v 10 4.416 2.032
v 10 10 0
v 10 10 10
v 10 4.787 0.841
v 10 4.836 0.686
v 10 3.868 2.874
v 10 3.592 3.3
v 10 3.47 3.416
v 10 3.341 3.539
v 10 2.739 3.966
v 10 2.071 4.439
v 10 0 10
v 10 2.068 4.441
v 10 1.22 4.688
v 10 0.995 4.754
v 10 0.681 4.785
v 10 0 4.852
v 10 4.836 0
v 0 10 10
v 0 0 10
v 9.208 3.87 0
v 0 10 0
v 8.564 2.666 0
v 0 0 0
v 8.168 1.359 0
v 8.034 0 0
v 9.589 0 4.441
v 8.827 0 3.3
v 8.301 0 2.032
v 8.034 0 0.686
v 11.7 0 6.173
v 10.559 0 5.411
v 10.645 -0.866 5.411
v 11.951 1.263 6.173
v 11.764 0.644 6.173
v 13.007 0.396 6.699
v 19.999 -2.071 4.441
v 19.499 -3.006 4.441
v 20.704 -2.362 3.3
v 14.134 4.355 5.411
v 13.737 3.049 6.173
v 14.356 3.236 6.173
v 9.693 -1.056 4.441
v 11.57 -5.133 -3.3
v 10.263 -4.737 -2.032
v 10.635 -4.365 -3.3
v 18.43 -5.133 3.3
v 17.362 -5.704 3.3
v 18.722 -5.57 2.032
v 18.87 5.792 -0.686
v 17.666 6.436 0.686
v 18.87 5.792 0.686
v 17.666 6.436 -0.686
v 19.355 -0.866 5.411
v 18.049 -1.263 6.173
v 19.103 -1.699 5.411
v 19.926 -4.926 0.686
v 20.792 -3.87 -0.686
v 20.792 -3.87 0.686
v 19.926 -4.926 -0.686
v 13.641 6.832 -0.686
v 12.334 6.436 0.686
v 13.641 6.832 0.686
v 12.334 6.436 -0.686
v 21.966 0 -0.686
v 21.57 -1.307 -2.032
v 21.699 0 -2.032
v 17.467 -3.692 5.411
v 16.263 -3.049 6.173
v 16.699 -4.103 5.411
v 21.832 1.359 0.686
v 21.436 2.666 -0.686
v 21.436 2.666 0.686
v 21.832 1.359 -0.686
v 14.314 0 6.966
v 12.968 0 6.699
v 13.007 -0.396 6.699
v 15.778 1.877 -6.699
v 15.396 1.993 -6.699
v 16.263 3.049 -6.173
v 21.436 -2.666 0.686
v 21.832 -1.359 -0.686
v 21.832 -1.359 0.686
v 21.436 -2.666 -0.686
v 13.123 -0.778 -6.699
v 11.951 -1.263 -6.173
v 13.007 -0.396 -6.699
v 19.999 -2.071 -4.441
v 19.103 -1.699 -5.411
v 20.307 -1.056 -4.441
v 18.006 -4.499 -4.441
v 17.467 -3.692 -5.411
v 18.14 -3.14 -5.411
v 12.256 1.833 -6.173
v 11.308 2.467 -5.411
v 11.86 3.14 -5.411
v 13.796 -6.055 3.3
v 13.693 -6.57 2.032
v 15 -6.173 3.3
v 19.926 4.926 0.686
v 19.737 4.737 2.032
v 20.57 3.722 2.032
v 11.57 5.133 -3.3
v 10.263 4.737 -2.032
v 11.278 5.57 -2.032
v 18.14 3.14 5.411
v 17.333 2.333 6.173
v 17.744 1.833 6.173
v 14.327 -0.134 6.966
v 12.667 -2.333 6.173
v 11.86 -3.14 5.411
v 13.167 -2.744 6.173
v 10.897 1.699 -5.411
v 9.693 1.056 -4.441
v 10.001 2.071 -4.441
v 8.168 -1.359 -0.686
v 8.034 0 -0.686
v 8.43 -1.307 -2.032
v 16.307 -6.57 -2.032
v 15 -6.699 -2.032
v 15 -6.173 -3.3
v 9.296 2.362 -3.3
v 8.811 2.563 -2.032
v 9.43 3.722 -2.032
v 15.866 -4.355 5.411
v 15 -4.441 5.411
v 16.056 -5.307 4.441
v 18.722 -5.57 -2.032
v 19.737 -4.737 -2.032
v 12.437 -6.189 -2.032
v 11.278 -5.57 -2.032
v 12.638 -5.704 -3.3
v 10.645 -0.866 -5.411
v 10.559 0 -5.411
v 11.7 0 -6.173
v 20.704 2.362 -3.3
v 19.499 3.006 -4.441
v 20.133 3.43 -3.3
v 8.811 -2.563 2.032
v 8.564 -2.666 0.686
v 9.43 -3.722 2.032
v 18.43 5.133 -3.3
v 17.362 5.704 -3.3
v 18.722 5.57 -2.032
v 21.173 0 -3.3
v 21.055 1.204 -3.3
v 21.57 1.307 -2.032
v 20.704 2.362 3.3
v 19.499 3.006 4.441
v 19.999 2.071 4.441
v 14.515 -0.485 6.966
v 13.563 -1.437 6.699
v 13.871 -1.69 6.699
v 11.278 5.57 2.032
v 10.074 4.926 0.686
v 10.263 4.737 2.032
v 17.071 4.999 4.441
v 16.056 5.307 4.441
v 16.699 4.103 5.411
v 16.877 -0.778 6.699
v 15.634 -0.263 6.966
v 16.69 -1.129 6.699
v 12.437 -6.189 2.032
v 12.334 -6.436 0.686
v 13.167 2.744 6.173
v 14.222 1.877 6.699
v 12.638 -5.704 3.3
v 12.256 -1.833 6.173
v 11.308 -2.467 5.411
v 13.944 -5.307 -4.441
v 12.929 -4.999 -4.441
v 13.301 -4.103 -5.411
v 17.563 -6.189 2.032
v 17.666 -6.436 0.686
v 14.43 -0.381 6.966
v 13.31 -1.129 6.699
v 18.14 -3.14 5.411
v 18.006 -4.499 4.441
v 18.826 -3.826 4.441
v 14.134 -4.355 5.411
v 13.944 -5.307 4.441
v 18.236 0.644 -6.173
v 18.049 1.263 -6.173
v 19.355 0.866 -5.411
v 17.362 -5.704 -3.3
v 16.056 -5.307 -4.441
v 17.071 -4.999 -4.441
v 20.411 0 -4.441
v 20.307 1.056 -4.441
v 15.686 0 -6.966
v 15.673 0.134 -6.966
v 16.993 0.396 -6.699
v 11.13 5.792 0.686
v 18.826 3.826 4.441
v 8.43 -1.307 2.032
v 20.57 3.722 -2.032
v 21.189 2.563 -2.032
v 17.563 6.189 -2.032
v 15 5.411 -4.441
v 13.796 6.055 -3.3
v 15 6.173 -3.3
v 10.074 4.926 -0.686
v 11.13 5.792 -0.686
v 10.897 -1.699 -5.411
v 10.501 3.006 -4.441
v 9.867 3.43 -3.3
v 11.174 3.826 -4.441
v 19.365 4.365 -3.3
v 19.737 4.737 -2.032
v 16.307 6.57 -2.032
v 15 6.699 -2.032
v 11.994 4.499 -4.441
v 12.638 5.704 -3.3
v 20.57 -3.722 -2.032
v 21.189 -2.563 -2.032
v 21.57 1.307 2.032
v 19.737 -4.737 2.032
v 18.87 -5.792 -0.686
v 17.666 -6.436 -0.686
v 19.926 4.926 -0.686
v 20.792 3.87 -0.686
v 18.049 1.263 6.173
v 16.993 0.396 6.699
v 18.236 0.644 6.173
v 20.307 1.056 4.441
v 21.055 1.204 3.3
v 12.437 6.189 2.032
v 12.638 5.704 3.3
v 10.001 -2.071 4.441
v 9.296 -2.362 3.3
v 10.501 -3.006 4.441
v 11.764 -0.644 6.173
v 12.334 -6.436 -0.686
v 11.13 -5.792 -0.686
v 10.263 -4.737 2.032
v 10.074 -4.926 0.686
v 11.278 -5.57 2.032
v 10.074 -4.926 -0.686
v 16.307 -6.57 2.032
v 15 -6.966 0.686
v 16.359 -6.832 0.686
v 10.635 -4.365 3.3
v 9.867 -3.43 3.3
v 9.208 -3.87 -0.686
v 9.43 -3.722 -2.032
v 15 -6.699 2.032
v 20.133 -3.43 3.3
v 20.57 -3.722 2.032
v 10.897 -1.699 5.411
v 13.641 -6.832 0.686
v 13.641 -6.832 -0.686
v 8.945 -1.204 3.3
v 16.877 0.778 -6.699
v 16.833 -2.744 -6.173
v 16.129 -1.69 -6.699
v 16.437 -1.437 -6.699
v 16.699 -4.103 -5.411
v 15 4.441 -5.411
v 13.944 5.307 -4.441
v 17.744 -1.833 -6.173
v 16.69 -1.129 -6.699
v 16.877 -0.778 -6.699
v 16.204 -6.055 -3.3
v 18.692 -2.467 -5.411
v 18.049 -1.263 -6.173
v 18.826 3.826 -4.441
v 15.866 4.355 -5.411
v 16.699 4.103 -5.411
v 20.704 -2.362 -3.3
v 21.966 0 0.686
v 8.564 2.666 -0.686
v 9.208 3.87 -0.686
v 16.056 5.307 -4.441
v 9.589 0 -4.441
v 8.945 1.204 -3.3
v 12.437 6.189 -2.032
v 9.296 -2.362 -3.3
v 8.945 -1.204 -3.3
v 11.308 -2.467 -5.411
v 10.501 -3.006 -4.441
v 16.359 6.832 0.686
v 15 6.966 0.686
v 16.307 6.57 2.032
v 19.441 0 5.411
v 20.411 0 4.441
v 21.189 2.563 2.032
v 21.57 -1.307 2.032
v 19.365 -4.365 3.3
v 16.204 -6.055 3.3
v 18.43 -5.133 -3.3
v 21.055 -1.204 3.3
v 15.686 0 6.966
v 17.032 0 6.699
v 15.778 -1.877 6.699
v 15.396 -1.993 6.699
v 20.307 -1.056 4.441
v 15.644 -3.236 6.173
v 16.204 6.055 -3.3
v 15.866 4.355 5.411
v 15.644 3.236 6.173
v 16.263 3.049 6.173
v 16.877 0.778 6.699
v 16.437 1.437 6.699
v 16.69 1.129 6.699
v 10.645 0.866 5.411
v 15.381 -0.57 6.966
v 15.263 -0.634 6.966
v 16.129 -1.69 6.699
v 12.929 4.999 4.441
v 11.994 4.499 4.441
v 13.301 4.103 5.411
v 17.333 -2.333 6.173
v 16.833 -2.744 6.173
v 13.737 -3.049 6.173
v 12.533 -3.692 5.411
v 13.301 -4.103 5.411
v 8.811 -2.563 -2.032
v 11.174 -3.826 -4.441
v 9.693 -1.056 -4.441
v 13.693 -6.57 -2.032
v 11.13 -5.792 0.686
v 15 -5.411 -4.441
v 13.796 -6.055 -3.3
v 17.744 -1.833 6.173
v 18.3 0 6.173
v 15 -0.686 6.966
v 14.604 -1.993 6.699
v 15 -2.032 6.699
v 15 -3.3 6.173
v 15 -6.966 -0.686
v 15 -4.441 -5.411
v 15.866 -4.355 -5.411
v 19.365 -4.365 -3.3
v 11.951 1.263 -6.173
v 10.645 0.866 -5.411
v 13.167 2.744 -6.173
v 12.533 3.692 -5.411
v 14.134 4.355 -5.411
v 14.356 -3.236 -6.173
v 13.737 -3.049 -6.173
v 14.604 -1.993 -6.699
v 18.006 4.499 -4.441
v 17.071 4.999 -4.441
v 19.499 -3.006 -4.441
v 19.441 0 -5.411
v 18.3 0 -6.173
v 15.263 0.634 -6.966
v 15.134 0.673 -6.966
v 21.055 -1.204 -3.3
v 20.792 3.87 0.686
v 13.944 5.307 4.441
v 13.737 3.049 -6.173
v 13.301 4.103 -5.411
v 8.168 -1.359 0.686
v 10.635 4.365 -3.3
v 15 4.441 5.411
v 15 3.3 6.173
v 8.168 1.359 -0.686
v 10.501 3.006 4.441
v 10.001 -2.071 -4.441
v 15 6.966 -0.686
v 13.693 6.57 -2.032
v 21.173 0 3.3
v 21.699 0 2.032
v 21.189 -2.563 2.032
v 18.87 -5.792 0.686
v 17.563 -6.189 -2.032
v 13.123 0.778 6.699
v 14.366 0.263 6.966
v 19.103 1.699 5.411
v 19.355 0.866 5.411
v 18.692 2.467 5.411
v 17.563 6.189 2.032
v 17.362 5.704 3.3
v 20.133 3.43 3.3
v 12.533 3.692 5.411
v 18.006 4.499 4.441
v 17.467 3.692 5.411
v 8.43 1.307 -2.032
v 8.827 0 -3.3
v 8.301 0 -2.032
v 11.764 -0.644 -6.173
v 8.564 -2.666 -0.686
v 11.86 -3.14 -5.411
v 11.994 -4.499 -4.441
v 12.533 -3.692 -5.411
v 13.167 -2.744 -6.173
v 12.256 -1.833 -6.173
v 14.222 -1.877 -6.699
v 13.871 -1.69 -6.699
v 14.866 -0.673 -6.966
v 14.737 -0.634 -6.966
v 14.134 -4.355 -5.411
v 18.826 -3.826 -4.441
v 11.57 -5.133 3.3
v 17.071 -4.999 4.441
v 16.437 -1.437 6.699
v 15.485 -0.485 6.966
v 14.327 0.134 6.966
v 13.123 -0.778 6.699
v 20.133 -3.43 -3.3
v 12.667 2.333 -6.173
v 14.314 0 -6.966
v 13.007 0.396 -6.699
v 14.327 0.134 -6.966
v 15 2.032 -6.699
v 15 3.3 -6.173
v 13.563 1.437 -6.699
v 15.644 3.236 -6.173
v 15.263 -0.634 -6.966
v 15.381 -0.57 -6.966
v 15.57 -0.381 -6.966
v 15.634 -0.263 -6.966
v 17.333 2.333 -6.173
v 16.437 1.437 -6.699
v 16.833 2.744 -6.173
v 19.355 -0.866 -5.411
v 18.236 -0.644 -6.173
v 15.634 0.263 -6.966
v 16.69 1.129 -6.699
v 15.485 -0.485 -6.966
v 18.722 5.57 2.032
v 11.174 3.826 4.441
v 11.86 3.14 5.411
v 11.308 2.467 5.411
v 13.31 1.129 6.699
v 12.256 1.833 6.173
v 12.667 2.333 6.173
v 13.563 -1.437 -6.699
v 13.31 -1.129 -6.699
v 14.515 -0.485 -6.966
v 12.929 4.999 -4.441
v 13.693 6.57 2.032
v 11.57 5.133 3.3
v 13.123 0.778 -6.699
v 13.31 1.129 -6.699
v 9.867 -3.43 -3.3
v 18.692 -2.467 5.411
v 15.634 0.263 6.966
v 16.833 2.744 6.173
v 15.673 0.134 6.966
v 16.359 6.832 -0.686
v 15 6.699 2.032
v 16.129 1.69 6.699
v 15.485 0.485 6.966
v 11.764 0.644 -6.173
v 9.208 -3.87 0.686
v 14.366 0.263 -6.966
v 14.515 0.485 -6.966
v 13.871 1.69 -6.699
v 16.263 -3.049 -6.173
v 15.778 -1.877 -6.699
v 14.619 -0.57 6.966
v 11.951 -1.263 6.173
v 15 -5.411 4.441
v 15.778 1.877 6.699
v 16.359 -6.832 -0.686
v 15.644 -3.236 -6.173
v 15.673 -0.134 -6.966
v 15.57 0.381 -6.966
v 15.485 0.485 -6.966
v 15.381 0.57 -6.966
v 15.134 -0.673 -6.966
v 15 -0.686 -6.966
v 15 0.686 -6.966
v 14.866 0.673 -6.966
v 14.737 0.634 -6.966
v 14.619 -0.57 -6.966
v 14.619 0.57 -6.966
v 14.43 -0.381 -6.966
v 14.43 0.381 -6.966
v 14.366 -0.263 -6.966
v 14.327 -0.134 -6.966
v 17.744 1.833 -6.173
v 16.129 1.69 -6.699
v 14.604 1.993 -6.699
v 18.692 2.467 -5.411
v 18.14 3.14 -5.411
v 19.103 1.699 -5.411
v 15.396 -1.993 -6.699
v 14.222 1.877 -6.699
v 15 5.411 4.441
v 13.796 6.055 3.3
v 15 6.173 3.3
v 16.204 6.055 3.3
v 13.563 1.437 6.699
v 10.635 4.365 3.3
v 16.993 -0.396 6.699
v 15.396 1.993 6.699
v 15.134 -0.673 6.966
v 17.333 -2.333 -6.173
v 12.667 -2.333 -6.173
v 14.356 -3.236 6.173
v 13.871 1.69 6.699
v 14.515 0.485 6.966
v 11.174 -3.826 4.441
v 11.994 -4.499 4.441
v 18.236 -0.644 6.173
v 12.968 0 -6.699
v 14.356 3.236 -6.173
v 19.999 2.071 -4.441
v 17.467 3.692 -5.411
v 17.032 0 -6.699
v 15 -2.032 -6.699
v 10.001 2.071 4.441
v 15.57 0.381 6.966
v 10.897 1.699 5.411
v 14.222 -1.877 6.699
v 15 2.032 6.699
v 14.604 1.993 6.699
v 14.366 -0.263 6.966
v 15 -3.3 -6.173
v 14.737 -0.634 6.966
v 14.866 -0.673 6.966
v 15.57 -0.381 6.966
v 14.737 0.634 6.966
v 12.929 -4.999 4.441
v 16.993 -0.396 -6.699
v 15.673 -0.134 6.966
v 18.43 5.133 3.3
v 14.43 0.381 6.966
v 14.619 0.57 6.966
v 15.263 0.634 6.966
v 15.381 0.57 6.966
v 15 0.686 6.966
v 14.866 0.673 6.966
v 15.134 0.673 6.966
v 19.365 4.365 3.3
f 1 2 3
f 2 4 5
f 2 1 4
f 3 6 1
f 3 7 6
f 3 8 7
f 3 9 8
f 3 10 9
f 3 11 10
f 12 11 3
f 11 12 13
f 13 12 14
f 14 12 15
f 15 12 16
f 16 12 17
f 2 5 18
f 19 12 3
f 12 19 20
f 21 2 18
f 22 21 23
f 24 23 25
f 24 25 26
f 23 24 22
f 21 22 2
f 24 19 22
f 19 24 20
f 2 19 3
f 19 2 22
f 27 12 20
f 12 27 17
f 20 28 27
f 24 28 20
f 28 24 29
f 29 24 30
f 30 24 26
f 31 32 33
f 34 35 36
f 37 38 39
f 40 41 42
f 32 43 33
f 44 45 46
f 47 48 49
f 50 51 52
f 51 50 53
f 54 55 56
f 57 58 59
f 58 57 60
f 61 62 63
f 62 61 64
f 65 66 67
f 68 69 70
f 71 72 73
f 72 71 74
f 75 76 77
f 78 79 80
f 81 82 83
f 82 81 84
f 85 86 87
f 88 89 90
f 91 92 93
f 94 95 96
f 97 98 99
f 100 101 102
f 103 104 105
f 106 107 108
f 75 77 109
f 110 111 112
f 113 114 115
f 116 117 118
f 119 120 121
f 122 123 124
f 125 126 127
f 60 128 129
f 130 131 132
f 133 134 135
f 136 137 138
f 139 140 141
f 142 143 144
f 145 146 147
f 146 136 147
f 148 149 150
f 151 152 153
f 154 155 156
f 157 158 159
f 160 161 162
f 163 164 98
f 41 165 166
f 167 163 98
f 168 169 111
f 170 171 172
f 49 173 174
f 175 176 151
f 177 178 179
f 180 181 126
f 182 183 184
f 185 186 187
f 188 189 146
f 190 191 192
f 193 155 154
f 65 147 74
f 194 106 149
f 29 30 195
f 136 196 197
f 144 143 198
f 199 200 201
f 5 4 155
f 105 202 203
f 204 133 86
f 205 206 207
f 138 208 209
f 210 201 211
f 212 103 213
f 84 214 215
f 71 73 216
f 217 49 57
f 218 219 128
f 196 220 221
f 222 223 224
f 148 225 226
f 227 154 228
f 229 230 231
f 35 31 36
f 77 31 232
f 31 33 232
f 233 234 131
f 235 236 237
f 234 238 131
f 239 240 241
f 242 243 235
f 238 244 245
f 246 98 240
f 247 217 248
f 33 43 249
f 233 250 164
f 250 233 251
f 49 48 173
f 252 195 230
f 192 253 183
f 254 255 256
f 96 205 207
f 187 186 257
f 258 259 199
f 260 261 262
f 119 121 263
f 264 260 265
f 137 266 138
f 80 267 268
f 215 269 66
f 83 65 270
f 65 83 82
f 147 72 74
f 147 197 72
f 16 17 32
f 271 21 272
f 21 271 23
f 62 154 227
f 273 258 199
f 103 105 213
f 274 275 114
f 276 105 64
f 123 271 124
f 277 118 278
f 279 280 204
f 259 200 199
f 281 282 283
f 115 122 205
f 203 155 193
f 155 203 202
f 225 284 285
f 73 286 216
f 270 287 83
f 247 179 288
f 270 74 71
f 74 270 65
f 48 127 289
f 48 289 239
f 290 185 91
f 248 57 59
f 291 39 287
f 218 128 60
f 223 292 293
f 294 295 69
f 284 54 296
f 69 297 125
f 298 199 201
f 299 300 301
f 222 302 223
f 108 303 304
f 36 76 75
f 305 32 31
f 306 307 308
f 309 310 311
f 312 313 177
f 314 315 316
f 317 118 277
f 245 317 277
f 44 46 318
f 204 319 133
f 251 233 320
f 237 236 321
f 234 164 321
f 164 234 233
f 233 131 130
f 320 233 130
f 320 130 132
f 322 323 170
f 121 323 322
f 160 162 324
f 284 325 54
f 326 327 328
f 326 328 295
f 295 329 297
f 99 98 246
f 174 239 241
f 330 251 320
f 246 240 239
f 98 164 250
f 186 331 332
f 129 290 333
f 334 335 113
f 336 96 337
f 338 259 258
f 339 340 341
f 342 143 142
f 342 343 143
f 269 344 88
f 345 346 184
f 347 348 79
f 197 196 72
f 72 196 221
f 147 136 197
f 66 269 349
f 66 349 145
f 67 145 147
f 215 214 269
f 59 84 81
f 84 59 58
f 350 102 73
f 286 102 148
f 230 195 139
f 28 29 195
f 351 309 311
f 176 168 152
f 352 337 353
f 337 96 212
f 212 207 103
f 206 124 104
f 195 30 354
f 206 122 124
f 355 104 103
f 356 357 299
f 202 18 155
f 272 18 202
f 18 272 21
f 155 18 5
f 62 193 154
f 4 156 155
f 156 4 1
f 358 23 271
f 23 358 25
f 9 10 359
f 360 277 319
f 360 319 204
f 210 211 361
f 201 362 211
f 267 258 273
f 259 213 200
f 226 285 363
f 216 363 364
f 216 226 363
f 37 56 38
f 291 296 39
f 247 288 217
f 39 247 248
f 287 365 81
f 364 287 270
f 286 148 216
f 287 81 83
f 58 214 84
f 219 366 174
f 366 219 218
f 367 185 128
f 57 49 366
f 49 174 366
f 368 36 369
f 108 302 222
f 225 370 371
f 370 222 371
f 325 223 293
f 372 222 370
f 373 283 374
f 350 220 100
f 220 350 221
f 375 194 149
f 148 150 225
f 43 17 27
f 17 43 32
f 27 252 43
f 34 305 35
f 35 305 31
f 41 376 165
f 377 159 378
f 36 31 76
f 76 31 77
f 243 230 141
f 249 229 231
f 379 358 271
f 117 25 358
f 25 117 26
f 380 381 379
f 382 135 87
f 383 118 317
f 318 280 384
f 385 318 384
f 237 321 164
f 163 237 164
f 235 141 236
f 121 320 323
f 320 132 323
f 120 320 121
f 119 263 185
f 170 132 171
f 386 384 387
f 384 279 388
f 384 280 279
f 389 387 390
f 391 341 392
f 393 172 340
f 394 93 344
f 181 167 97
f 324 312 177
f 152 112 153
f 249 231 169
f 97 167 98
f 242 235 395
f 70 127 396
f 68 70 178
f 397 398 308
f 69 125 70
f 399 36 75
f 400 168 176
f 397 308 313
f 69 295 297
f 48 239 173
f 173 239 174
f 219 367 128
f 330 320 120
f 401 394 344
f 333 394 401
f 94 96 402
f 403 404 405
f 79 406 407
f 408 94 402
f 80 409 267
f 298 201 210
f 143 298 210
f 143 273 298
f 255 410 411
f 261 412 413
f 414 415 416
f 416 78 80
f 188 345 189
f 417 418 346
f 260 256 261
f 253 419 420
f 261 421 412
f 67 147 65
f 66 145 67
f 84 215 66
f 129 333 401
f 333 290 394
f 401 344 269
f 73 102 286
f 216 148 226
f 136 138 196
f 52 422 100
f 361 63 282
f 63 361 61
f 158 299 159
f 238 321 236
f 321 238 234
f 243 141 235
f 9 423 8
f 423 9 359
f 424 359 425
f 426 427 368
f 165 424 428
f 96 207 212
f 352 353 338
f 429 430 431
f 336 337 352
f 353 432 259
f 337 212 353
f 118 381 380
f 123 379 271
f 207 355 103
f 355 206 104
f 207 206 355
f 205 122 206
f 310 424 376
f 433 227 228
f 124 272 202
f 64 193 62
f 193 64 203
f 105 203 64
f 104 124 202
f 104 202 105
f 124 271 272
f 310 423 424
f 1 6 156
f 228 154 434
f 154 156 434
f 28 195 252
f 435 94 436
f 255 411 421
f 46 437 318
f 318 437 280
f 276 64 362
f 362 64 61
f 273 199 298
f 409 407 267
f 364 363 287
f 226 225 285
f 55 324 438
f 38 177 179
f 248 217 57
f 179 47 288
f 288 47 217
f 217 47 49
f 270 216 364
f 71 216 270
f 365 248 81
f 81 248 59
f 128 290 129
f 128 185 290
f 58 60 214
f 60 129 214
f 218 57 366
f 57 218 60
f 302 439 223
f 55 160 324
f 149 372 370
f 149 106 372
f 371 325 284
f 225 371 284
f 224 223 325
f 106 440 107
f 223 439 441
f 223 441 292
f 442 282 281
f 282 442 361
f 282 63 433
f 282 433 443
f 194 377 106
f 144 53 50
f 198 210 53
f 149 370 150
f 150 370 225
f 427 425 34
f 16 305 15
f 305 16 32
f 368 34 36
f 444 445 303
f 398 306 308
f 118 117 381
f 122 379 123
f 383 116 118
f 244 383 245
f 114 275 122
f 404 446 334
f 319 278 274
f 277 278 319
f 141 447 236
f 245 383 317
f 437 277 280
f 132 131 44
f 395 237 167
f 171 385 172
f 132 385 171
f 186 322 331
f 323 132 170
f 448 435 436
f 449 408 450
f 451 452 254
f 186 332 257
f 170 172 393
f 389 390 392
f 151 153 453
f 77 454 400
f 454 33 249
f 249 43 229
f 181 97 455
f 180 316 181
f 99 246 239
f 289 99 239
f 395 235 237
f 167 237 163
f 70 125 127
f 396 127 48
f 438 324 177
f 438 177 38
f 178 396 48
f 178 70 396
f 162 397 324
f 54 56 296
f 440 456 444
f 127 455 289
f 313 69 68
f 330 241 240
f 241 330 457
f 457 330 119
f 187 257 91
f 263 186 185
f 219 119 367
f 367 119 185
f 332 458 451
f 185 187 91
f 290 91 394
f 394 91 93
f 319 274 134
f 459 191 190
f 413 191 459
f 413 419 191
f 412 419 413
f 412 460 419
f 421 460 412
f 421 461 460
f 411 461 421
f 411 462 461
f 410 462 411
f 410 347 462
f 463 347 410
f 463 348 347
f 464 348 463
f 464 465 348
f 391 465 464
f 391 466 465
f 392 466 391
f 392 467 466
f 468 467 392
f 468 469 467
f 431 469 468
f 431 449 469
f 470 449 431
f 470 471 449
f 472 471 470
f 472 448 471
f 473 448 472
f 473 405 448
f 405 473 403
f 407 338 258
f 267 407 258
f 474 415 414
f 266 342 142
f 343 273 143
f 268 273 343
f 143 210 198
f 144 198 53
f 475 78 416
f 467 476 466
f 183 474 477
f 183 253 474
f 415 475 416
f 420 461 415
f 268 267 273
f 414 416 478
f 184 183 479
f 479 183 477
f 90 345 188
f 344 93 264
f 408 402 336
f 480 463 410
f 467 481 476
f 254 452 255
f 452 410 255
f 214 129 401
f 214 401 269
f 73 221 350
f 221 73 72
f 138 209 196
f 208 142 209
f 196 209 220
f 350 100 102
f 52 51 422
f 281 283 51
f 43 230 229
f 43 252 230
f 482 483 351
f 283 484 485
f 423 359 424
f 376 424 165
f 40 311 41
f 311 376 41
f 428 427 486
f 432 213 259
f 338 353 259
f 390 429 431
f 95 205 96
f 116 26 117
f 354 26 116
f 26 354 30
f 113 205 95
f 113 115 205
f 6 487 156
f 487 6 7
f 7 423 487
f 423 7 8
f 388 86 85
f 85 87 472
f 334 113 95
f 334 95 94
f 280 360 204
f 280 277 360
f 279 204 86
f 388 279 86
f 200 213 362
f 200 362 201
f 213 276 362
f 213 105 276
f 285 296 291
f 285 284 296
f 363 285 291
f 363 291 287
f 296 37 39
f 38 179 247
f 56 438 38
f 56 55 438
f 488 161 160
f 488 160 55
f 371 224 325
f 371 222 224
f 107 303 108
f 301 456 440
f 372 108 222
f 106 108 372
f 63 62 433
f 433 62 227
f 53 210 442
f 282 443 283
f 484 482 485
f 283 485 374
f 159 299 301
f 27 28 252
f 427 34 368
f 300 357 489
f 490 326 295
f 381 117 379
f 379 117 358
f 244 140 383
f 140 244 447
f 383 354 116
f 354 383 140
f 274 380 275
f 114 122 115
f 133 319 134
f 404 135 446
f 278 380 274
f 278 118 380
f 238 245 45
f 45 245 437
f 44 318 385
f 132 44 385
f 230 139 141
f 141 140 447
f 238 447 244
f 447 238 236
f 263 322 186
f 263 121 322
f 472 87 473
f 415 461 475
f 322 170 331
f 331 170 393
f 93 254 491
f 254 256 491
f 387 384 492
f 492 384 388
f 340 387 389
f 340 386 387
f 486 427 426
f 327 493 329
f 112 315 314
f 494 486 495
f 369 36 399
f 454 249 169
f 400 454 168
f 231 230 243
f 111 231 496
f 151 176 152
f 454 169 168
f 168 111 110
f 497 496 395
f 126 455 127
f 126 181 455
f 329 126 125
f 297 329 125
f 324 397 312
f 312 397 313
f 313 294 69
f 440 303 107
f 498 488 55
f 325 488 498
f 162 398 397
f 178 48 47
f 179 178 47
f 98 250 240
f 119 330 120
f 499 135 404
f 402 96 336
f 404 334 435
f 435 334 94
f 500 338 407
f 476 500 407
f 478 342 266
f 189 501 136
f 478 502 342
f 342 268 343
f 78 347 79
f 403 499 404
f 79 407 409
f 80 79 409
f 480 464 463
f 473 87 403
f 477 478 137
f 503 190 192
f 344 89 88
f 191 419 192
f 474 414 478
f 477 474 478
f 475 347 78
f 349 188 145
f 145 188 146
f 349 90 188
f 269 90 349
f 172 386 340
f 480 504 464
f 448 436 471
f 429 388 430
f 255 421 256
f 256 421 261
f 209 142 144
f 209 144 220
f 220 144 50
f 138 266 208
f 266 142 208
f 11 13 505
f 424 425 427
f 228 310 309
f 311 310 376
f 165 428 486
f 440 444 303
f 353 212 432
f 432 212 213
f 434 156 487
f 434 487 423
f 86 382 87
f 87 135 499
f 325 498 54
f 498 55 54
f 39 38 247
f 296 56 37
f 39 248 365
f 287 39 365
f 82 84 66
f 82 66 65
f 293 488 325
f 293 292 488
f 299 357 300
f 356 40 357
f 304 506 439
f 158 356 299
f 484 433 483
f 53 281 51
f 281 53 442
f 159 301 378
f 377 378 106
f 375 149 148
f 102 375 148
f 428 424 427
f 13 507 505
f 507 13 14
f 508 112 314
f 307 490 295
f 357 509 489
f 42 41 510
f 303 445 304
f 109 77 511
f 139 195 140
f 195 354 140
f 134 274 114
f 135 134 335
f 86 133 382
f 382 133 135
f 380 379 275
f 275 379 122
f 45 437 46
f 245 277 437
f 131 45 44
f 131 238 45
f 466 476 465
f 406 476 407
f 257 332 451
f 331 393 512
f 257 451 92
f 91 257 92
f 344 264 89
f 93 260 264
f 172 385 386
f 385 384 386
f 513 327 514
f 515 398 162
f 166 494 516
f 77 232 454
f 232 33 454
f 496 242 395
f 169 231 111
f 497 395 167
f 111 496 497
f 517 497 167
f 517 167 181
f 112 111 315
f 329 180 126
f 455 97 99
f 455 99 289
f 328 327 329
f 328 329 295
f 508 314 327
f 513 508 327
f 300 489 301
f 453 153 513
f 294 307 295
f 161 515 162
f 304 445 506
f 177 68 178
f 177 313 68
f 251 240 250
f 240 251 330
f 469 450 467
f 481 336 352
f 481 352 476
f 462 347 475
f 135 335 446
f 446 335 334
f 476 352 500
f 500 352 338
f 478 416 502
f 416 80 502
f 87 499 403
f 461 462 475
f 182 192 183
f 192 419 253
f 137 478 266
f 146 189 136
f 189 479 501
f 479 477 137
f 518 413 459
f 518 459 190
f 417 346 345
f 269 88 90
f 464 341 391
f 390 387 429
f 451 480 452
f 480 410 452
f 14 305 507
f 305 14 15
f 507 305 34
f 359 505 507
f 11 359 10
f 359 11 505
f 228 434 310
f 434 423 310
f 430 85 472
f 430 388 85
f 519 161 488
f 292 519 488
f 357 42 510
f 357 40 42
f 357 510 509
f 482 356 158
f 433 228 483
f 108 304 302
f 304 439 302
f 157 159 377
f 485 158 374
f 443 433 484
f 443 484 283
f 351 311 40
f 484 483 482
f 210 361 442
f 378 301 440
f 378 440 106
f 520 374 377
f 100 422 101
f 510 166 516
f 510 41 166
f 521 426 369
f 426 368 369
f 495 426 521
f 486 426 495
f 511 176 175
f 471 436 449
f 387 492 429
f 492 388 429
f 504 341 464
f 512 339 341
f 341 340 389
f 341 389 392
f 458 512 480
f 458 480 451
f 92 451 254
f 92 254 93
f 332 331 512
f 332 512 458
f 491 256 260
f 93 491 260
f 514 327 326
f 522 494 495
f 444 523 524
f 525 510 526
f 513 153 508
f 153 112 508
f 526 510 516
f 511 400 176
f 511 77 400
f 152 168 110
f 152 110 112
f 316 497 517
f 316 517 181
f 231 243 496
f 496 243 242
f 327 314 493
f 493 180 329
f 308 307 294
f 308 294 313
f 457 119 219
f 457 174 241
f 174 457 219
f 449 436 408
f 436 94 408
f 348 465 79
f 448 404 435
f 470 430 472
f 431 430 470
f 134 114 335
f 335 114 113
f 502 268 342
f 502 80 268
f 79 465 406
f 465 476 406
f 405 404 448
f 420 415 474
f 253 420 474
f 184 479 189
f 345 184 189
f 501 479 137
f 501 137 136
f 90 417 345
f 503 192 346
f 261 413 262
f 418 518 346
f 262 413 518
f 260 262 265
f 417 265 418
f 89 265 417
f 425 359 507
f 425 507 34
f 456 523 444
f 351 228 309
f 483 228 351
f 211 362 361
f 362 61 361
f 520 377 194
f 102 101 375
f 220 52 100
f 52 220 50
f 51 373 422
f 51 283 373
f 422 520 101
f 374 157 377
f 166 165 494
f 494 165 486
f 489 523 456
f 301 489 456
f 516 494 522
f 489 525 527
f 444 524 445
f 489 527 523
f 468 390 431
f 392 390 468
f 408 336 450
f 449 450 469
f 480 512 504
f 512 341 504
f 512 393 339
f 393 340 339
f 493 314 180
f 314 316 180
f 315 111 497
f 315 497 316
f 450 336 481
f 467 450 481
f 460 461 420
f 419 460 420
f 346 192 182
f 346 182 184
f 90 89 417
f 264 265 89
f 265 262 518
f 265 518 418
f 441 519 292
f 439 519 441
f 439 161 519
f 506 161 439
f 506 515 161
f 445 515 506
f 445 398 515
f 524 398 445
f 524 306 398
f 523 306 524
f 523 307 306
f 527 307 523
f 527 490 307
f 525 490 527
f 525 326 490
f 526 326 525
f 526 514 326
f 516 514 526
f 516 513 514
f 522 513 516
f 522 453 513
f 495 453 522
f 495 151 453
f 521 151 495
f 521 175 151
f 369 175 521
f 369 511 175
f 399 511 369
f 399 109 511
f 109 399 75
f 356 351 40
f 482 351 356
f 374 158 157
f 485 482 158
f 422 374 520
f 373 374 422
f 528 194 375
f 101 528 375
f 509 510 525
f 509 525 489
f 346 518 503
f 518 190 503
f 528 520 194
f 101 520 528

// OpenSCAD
color("blue") cube([10, 10, 10]);
color("green") translate([15, 0, 0]) sphere(r = 7, $fn = 32);
